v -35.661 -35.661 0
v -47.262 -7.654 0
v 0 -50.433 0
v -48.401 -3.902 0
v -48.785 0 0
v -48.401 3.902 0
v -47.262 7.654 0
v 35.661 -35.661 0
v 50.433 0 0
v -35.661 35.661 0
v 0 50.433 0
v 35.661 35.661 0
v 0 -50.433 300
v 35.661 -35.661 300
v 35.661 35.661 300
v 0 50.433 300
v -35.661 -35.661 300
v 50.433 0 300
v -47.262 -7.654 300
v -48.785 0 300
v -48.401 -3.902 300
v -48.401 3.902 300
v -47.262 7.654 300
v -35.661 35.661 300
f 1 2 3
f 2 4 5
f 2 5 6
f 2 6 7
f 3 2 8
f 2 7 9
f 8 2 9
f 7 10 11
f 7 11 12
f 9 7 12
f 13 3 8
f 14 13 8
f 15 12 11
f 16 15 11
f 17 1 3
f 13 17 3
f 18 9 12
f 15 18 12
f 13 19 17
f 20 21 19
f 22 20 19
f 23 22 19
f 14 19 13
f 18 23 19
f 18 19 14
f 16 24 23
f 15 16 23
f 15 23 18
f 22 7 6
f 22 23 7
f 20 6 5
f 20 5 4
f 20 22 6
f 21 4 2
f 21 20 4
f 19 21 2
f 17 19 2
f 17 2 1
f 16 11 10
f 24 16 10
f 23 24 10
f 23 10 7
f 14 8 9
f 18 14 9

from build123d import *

# Parameters (mm, degrees)
F1_DEPTH = 300
F2_R     = 20


with BuildPart() as f1:
    # F0 (on Top) → F1 (new body)
    with BuildSketch(Plane.XY):
        Polygon((35.661297, 35.661297), (0, 50.432689), (-35.661297, 35.661297), (-50.432689, 0), (-35.661297, -35.661297), (0, -50.432689), (35.661297, -35.661297), (50.432689, 0), align=None)
    extrude(amount=F1_DEPTH)

    # F2
    f2_edges = [f1.edges().sort_by_distance(p)[0] for p in [
        (-50.432689, 0, 150),
    ]]
    fillet(f2_edges, radius=F2_R)


solid = f1.part
